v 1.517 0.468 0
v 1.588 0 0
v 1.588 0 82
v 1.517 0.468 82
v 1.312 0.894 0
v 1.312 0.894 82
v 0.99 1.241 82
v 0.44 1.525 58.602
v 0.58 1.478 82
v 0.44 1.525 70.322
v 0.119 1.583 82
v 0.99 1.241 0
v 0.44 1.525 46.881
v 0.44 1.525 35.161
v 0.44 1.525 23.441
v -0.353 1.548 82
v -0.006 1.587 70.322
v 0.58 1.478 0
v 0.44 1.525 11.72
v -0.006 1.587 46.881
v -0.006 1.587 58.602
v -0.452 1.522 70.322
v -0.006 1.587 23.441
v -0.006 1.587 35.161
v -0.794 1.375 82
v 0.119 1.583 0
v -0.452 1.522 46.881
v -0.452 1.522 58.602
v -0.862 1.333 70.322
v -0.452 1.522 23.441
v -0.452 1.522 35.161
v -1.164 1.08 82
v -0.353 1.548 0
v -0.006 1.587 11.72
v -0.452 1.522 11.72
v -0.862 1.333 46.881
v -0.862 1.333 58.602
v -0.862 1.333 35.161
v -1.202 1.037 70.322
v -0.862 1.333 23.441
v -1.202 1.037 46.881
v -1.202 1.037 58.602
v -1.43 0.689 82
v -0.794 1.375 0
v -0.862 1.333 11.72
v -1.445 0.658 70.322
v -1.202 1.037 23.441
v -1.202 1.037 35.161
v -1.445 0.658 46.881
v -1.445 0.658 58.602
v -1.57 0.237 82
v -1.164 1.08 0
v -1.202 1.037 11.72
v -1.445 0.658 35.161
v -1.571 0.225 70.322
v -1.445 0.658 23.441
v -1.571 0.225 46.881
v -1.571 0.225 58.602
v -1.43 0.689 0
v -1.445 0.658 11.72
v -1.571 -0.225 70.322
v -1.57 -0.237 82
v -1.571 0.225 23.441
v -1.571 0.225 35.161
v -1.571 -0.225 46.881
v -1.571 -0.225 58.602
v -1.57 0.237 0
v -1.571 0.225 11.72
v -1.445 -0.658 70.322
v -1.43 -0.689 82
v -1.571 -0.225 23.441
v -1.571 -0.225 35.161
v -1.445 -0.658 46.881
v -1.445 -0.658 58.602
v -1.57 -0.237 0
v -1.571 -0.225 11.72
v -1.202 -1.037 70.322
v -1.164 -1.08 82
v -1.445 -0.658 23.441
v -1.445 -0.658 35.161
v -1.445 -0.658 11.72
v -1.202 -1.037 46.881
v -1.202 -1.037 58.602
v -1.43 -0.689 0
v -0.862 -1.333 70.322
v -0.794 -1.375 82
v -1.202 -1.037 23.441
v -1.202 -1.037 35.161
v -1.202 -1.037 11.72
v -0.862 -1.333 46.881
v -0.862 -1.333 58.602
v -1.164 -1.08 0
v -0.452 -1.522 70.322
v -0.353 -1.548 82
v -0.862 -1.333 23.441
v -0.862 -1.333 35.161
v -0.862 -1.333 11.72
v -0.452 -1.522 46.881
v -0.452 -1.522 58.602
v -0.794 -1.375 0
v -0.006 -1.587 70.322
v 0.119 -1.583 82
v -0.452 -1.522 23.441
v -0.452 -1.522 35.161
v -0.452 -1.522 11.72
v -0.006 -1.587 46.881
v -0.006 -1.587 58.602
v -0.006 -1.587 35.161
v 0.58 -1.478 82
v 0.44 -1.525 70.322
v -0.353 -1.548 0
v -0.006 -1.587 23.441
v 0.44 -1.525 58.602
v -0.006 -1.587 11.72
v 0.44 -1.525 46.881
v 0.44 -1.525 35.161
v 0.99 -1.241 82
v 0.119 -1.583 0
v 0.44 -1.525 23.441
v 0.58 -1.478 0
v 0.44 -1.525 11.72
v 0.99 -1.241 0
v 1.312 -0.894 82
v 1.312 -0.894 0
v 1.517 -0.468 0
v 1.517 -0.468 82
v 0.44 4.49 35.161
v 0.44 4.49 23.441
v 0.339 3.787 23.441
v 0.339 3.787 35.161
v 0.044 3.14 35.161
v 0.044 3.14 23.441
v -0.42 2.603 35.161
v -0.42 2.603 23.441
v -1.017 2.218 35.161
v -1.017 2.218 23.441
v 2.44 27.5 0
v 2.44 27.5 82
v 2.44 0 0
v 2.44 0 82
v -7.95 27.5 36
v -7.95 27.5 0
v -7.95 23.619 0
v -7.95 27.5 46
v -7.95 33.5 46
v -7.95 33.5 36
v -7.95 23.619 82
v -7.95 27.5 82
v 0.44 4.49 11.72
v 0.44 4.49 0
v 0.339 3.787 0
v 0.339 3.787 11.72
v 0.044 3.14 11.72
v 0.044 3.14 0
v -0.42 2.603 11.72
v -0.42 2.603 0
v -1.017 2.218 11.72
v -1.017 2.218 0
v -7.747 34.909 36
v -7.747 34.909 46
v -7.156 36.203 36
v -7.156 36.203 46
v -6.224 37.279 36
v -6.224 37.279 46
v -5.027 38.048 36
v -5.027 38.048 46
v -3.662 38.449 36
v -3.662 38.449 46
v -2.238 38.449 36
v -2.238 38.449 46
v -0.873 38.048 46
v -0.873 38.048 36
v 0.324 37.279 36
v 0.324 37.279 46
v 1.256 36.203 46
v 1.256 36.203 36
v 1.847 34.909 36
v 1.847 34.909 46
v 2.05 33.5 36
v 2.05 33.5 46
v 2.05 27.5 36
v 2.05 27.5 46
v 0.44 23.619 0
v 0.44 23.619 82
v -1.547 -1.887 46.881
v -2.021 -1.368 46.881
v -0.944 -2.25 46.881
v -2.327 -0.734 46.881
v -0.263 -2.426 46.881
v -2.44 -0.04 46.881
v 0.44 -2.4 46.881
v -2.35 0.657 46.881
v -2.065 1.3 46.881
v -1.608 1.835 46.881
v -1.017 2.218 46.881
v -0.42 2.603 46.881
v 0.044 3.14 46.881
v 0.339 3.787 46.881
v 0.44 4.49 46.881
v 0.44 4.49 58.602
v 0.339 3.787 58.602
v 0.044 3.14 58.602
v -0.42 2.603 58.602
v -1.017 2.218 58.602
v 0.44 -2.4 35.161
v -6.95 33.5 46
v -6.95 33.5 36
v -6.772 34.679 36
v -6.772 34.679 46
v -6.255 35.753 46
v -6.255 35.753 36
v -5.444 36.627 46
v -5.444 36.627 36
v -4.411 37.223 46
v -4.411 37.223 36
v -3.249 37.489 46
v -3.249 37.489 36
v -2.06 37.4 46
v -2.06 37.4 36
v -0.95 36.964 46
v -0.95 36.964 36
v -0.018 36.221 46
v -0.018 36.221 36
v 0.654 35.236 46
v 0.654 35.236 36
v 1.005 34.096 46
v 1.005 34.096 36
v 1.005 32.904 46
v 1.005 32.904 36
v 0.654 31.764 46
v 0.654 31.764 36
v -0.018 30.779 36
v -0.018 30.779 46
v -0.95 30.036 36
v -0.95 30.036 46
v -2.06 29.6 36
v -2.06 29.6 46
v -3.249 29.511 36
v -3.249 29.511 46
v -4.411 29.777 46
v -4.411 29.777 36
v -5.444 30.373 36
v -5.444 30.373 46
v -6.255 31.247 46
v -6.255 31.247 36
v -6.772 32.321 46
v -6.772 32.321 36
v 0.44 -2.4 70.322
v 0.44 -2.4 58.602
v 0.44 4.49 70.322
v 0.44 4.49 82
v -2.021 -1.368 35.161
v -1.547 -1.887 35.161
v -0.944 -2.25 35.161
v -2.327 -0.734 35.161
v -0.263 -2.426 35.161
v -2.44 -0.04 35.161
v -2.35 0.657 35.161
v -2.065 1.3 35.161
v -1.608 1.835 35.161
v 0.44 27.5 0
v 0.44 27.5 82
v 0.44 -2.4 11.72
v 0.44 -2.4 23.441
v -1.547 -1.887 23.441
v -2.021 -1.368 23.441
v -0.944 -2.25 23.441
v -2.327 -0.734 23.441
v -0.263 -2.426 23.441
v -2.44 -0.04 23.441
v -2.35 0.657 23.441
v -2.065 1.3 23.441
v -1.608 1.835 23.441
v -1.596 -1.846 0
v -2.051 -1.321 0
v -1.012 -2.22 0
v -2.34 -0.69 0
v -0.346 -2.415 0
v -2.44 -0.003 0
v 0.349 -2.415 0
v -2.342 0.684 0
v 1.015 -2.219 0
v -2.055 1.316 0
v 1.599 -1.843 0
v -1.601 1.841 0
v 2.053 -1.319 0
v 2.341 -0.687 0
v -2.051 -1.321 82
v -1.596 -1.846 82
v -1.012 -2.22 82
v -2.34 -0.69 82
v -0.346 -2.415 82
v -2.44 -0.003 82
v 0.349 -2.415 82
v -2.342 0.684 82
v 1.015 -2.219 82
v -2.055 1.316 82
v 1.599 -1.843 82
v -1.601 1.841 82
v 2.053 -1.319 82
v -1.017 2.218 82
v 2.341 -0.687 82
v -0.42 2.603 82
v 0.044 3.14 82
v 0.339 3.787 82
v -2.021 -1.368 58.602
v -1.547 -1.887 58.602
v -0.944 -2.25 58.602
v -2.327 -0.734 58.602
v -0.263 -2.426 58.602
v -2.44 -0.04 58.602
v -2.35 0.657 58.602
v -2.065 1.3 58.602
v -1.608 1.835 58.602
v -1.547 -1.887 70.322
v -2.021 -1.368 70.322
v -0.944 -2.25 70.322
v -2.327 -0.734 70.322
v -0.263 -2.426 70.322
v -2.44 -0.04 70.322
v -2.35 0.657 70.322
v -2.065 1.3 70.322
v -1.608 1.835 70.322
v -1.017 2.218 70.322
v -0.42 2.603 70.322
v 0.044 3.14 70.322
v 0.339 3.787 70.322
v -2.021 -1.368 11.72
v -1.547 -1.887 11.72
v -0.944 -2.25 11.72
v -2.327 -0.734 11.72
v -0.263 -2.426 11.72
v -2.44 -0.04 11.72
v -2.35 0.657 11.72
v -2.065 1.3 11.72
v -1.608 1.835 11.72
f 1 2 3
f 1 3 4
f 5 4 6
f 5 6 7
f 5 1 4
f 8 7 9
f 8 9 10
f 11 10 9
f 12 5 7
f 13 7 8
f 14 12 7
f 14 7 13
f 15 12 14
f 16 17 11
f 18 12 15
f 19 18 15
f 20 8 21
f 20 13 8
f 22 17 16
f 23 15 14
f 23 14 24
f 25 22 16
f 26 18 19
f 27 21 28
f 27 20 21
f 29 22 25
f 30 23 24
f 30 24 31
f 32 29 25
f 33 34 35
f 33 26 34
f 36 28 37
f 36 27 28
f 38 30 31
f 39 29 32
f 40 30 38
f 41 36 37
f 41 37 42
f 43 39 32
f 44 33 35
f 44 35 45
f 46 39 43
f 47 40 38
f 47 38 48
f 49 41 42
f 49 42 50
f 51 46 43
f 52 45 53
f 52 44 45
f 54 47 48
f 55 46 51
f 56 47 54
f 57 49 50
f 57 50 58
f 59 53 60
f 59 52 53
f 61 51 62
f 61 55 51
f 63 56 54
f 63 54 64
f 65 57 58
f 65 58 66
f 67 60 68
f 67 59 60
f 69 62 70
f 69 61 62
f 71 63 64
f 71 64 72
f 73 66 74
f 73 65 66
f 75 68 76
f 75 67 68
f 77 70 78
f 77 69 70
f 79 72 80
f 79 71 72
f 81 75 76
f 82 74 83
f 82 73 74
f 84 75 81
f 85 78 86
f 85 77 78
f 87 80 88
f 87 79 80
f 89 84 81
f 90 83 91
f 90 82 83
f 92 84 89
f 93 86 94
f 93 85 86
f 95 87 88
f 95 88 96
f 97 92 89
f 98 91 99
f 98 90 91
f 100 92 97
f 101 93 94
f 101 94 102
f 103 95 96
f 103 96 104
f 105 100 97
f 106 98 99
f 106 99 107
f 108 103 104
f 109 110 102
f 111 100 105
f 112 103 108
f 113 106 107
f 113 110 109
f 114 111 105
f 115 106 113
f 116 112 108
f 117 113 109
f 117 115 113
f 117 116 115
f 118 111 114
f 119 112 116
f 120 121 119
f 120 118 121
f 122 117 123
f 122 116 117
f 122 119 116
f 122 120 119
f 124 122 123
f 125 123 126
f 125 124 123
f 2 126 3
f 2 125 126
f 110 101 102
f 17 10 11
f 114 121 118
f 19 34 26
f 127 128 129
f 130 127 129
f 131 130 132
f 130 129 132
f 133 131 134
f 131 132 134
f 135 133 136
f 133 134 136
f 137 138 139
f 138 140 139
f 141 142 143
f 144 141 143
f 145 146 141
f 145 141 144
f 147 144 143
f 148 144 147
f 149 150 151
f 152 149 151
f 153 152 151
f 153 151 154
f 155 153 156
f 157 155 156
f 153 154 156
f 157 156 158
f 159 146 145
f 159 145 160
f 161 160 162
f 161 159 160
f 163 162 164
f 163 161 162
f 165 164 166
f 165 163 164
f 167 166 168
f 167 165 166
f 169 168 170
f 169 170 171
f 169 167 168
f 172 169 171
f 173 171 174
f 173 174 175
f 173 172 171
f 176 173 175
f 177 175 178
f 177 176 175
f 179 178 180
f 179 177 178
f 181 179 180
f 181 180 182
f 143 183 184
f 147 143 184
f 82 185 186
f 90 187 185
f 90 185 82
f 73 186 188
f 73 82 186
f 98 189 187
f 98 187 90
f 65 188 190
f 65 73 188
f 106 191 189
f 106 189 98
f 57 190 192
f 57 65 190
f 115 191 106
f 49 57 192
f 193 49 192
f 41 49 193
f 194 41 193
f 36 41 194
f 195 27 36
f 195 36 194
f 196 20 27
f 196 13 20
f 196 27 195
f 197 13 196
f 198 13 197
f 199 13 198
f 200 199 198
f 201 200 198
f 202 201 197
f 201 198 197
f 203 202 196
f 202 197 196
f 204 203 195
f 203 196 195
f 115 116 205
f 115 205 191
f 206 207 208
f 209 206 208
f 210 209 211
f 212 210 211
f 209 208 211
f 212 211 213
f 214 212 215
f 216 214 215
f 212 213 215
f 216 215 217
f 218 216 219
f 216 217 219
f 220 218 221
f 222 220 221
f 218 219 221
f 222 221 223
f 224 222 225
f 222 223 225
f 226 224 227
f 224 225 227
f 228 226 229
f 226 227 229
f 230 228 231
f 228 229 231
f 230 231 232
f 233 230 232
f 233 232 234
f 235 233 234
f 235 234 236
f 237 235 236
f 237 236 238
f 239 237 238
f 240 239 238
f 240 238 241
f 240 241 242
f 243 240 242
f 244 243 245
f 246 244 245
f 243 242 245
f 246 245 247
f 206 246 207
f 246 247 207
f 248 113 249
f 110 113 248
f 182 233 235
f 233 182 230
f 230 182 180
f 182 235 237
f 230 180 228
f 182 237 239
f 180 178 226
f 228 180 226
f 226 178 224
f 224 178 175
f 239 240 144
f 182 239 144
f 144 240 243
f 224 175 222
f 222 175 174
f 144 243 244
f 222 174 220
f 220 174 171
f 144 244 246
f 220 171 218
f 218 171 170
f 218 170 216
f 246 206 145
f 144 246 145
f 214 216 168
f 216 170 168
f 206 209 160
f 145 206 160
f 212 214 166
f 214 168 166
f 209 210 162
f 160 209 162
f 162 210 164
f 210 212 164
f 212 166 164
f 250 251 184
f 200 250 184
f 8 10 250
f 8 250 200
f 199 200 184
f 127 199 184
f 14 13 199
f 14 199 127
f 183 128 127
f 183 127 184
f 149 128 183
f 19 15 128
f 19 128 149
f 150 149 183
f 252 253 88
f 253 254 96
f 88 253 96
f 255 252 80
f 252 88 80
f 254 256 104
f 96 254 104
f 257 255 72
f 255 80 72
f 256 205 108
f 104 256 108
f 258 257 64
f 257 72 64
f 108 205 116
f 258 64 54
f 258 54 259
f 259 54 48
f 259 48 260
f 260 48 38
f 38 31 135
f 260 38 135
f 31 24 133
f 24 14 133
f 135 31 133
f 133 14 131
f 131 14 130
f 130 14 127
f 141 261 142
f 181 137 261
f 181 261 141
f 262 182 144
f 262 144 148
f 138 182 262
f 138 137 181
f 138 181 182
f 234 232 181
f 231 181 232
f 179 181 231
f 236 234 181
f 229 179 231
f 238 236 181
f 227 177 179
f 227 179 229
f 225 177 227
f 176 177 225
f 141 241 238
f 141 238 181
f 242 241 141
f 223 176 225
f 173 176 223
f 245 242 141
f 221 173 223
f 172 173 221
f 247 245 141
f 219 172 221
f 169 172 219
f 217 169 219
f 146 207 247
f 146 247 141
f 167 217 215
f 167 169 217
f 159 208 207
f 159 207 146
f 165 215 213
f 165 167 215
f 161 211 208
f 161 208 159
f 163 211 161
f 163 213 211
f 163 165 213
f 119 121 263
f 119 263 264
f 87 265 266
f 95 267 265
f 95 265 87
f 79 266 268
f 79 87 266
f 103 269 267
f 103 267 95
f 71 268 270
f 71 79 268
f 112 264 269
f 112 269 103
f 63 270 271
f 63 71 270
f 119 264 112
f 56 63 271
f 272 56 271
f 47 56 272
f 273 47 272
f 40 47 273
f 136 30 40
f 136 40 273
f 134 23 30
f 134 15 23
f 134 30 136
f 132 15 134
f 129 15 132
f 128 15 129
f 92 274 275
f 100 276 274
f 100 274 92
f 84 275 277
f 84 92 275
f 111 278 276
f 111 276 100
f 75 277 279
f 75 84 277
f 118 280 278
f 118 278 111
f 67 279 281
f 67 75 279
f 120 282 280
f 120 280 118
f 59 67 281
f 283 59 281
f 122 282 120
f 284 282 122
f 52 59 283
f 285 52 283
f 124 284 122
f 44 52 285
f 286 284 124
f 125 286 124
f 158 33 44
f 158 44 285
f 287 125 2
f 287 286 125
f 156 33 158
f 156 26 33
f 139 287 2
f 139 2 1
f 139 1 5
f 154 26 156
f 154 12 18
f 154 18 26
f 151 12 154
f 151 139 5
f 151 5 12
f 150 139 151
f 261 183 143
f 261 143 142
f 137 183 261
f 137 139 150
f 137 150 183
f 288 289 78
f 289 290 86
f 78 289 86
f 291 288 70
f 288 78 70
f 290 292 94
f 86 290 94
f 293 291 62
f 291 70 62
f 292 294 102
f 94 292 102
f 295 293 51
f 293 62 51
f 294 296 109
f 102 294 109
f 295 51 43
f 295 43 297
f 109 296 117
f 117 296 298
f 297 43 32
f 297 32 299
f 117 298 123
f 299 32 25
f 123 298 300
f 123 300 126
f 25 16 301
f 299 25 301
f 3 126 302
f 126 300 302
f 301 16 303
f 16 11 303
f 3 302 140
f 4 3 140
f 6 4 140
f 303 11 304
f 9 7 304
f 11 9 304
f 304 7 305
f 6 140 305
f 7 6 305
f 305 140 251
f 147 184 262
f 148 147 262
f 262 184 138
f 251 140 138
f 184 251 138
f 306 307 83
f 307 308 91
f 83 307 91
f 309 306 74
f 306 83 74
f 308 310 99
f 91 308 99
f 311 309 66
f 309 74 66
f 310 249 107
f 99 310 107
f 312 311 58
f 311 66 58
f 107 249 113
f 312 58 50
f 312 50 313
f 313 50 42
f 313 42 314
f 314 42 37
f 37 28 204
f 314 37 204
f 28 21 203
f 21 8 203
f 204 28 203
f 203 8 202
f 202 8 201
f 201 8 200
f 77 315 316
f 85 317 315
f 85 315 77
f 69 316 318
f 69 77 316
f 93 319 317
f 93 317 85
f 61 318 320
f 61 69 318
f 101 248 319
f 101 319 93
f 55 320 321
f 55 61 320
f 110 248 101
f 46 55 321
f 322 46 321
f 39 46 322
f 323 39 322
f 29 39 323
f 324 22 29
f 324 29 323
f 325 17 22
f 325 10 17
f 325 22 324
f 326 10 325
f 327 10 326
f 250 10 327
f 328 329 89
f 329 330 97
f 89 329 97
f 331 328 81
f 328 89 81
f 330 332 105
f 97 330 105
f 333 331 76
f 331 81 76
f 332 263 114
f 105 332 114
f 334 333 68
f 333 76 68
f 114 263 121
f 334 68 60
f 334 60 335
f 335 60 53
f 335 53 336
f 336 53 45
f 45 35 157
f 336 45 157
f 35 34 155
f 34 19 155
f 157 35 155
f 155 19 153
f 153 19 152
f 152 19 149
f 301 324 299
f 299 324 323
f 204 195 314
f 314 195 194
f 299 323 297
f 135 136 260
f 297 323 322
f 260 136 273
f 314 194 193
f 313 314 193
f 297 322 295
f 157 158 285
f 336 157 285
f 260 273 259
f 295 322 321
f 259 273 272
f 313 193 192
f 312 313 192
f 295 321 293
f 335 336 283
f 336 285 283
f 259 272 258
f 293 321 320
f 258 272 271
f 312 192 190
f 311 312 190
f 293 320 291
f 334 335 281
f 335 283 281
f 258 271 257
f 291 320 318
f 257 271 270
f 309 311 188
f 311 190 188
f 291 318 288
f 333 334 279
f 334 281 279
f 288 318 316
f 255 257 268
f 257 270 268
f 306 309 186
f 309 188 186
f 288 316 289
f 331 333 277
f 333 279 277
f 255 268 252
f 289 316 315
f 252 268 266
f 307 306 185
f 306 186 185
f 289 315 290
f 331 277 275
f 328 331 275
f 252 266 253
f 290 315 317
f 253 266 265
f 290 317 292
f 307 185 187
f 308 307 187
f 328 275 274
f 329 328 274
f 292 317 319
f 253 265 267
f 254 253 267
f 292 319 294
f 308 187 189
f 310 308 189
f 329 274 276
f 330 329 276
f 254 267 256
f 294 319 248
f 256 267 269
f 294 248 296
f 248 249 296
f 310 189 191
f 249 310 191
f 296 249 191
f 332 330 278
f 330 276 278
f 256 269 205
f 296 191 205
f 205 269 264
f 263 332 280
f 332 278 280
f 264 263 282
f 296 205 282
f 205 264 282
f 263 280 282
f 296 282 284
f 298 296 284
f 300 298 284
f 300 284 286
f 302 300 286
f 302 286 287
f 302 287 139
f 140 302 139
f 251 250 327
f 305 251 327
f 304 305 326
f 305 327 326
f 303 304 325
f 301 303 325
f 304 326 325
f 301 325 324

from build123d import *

# Parameters (mm, degrees)
SKETCH1_R           = 1.5875
BOSS_EXTRUDE1_DEPTH = 82
SKETCH3_W           = 2
SKETCH3_H           = 82
BOSS_EXTRUDE4_DEPTH = 2.5
SKETCH6_W           = 82
SKETCH6_H           = 3.880734095
BOSS_EXTRUDE5_DEPTH = 8.39
BOSS_EXTRUDE6_START = -36
SKETCH8_R           = 4
BOSS_EXTRUDE6_DEPTH = 10
SKETCH10_W          = 11.720322
SKETCH10_H          = 6.929988864
CUT_EXTRUDE1_DEPTH  = 10
LPATTERN1_COUNT     = 3
LPATTERN1_PITCH     = 23.440644


with BuildPart() as part:
    # Sketch1 → Boss-Extrude1 (new body)
    with BuildSketch(Plane.XY):
        with BuildLine():
            Line((2.44, 0), (2.44, 25))
            Line((2.44, 25), (0.44, 25))
            Line((0.44, 25), (0.44, 4.489988864))
            ThreePointArc((0.44, 4.489988864), (0.044314057, 3.140225052), (-1.017489879, 2.217727293))
            ThreePointArc((-1.017489879, 2.217727293), (-1.317369481, -2.05381052), (2.44, 0))
        make_face()
        Circle(SKETCH1_R, mode=Mode.SUBTRACT)
    extrude(amount=BOSS_EXTRUDE1_DEPTH)

    # Sketch3 → Boss-Extrude4 (add)
    with BuildSketch(Plane(origin=(0, 25, 0), x_dir=(1, 0, 0), z_dir=(0, 1, 0))):
        with Locations((1.44, -41)):
            Rectangle(SKETCH3_W, SKETCH3_H)
    extrude(amount=BOSS_EXTRUDE4_DEPTH)

    # Sketch6 → Boss-Extrude5 (add)
    with BuildSketch(Plane.ZY.offset(-0.44)):
        with Locations((41, 25.559632953)):
            Rectangle(SKETCH6_W, SKETCH6_H)
    extrude(amount=BOSS_EXTRUDE5_DEPTH)

    # Sketch8 → Boss-Extrude6 (add)
    with BuildSketch(Plane(origin=(0, 0, 0), x_dir=(-1, 0, 0), z_dir=(0, 0, -1)).offset(BOSS_EXTRUDE6_START)):
        with BuildLine():
            Line((7.95, 27.5), (7.95, 33.5))
            ThreePointArc((7.95, 33.5), (2.95, 38.5), (-2.05, 33.5))
            Line((-2.05, 33.5), (-2.05, 27.5))
            Line((-2.05, 27.5), (7.95, 27.5))
        make_face()
        with Locations((2.95, 33.5)):
            Circle(SKETCH8_R, mode=Mode.SUBTRACT)
    extrude(amount=-BOSS_EXTRUDE6_DEPTH)

    # Sketch10 → Cut-Extrude1 (cut)
    with BuildSketch(Plane.ZY.offset(-0.44)):
        with Locations((17.580483, 1.024994432)):
            Rectangle(SKETCH10_W, SKETCH10_H)
    cut_extrude1 = extrude(amount=CUT_EXTRUDE1_DEPTH, mode=Mode.SUBTRACT)

    # LPattern1: Cut-Extrude1 ×3
    with Locations(*[(0, 0, i * LPATTERN1_PITCH) for i in range(1, LPATTERN1_COUNT)]):
        add(cut_extrude1, mode=Mode.SUBTRACT)


solid = part.part
